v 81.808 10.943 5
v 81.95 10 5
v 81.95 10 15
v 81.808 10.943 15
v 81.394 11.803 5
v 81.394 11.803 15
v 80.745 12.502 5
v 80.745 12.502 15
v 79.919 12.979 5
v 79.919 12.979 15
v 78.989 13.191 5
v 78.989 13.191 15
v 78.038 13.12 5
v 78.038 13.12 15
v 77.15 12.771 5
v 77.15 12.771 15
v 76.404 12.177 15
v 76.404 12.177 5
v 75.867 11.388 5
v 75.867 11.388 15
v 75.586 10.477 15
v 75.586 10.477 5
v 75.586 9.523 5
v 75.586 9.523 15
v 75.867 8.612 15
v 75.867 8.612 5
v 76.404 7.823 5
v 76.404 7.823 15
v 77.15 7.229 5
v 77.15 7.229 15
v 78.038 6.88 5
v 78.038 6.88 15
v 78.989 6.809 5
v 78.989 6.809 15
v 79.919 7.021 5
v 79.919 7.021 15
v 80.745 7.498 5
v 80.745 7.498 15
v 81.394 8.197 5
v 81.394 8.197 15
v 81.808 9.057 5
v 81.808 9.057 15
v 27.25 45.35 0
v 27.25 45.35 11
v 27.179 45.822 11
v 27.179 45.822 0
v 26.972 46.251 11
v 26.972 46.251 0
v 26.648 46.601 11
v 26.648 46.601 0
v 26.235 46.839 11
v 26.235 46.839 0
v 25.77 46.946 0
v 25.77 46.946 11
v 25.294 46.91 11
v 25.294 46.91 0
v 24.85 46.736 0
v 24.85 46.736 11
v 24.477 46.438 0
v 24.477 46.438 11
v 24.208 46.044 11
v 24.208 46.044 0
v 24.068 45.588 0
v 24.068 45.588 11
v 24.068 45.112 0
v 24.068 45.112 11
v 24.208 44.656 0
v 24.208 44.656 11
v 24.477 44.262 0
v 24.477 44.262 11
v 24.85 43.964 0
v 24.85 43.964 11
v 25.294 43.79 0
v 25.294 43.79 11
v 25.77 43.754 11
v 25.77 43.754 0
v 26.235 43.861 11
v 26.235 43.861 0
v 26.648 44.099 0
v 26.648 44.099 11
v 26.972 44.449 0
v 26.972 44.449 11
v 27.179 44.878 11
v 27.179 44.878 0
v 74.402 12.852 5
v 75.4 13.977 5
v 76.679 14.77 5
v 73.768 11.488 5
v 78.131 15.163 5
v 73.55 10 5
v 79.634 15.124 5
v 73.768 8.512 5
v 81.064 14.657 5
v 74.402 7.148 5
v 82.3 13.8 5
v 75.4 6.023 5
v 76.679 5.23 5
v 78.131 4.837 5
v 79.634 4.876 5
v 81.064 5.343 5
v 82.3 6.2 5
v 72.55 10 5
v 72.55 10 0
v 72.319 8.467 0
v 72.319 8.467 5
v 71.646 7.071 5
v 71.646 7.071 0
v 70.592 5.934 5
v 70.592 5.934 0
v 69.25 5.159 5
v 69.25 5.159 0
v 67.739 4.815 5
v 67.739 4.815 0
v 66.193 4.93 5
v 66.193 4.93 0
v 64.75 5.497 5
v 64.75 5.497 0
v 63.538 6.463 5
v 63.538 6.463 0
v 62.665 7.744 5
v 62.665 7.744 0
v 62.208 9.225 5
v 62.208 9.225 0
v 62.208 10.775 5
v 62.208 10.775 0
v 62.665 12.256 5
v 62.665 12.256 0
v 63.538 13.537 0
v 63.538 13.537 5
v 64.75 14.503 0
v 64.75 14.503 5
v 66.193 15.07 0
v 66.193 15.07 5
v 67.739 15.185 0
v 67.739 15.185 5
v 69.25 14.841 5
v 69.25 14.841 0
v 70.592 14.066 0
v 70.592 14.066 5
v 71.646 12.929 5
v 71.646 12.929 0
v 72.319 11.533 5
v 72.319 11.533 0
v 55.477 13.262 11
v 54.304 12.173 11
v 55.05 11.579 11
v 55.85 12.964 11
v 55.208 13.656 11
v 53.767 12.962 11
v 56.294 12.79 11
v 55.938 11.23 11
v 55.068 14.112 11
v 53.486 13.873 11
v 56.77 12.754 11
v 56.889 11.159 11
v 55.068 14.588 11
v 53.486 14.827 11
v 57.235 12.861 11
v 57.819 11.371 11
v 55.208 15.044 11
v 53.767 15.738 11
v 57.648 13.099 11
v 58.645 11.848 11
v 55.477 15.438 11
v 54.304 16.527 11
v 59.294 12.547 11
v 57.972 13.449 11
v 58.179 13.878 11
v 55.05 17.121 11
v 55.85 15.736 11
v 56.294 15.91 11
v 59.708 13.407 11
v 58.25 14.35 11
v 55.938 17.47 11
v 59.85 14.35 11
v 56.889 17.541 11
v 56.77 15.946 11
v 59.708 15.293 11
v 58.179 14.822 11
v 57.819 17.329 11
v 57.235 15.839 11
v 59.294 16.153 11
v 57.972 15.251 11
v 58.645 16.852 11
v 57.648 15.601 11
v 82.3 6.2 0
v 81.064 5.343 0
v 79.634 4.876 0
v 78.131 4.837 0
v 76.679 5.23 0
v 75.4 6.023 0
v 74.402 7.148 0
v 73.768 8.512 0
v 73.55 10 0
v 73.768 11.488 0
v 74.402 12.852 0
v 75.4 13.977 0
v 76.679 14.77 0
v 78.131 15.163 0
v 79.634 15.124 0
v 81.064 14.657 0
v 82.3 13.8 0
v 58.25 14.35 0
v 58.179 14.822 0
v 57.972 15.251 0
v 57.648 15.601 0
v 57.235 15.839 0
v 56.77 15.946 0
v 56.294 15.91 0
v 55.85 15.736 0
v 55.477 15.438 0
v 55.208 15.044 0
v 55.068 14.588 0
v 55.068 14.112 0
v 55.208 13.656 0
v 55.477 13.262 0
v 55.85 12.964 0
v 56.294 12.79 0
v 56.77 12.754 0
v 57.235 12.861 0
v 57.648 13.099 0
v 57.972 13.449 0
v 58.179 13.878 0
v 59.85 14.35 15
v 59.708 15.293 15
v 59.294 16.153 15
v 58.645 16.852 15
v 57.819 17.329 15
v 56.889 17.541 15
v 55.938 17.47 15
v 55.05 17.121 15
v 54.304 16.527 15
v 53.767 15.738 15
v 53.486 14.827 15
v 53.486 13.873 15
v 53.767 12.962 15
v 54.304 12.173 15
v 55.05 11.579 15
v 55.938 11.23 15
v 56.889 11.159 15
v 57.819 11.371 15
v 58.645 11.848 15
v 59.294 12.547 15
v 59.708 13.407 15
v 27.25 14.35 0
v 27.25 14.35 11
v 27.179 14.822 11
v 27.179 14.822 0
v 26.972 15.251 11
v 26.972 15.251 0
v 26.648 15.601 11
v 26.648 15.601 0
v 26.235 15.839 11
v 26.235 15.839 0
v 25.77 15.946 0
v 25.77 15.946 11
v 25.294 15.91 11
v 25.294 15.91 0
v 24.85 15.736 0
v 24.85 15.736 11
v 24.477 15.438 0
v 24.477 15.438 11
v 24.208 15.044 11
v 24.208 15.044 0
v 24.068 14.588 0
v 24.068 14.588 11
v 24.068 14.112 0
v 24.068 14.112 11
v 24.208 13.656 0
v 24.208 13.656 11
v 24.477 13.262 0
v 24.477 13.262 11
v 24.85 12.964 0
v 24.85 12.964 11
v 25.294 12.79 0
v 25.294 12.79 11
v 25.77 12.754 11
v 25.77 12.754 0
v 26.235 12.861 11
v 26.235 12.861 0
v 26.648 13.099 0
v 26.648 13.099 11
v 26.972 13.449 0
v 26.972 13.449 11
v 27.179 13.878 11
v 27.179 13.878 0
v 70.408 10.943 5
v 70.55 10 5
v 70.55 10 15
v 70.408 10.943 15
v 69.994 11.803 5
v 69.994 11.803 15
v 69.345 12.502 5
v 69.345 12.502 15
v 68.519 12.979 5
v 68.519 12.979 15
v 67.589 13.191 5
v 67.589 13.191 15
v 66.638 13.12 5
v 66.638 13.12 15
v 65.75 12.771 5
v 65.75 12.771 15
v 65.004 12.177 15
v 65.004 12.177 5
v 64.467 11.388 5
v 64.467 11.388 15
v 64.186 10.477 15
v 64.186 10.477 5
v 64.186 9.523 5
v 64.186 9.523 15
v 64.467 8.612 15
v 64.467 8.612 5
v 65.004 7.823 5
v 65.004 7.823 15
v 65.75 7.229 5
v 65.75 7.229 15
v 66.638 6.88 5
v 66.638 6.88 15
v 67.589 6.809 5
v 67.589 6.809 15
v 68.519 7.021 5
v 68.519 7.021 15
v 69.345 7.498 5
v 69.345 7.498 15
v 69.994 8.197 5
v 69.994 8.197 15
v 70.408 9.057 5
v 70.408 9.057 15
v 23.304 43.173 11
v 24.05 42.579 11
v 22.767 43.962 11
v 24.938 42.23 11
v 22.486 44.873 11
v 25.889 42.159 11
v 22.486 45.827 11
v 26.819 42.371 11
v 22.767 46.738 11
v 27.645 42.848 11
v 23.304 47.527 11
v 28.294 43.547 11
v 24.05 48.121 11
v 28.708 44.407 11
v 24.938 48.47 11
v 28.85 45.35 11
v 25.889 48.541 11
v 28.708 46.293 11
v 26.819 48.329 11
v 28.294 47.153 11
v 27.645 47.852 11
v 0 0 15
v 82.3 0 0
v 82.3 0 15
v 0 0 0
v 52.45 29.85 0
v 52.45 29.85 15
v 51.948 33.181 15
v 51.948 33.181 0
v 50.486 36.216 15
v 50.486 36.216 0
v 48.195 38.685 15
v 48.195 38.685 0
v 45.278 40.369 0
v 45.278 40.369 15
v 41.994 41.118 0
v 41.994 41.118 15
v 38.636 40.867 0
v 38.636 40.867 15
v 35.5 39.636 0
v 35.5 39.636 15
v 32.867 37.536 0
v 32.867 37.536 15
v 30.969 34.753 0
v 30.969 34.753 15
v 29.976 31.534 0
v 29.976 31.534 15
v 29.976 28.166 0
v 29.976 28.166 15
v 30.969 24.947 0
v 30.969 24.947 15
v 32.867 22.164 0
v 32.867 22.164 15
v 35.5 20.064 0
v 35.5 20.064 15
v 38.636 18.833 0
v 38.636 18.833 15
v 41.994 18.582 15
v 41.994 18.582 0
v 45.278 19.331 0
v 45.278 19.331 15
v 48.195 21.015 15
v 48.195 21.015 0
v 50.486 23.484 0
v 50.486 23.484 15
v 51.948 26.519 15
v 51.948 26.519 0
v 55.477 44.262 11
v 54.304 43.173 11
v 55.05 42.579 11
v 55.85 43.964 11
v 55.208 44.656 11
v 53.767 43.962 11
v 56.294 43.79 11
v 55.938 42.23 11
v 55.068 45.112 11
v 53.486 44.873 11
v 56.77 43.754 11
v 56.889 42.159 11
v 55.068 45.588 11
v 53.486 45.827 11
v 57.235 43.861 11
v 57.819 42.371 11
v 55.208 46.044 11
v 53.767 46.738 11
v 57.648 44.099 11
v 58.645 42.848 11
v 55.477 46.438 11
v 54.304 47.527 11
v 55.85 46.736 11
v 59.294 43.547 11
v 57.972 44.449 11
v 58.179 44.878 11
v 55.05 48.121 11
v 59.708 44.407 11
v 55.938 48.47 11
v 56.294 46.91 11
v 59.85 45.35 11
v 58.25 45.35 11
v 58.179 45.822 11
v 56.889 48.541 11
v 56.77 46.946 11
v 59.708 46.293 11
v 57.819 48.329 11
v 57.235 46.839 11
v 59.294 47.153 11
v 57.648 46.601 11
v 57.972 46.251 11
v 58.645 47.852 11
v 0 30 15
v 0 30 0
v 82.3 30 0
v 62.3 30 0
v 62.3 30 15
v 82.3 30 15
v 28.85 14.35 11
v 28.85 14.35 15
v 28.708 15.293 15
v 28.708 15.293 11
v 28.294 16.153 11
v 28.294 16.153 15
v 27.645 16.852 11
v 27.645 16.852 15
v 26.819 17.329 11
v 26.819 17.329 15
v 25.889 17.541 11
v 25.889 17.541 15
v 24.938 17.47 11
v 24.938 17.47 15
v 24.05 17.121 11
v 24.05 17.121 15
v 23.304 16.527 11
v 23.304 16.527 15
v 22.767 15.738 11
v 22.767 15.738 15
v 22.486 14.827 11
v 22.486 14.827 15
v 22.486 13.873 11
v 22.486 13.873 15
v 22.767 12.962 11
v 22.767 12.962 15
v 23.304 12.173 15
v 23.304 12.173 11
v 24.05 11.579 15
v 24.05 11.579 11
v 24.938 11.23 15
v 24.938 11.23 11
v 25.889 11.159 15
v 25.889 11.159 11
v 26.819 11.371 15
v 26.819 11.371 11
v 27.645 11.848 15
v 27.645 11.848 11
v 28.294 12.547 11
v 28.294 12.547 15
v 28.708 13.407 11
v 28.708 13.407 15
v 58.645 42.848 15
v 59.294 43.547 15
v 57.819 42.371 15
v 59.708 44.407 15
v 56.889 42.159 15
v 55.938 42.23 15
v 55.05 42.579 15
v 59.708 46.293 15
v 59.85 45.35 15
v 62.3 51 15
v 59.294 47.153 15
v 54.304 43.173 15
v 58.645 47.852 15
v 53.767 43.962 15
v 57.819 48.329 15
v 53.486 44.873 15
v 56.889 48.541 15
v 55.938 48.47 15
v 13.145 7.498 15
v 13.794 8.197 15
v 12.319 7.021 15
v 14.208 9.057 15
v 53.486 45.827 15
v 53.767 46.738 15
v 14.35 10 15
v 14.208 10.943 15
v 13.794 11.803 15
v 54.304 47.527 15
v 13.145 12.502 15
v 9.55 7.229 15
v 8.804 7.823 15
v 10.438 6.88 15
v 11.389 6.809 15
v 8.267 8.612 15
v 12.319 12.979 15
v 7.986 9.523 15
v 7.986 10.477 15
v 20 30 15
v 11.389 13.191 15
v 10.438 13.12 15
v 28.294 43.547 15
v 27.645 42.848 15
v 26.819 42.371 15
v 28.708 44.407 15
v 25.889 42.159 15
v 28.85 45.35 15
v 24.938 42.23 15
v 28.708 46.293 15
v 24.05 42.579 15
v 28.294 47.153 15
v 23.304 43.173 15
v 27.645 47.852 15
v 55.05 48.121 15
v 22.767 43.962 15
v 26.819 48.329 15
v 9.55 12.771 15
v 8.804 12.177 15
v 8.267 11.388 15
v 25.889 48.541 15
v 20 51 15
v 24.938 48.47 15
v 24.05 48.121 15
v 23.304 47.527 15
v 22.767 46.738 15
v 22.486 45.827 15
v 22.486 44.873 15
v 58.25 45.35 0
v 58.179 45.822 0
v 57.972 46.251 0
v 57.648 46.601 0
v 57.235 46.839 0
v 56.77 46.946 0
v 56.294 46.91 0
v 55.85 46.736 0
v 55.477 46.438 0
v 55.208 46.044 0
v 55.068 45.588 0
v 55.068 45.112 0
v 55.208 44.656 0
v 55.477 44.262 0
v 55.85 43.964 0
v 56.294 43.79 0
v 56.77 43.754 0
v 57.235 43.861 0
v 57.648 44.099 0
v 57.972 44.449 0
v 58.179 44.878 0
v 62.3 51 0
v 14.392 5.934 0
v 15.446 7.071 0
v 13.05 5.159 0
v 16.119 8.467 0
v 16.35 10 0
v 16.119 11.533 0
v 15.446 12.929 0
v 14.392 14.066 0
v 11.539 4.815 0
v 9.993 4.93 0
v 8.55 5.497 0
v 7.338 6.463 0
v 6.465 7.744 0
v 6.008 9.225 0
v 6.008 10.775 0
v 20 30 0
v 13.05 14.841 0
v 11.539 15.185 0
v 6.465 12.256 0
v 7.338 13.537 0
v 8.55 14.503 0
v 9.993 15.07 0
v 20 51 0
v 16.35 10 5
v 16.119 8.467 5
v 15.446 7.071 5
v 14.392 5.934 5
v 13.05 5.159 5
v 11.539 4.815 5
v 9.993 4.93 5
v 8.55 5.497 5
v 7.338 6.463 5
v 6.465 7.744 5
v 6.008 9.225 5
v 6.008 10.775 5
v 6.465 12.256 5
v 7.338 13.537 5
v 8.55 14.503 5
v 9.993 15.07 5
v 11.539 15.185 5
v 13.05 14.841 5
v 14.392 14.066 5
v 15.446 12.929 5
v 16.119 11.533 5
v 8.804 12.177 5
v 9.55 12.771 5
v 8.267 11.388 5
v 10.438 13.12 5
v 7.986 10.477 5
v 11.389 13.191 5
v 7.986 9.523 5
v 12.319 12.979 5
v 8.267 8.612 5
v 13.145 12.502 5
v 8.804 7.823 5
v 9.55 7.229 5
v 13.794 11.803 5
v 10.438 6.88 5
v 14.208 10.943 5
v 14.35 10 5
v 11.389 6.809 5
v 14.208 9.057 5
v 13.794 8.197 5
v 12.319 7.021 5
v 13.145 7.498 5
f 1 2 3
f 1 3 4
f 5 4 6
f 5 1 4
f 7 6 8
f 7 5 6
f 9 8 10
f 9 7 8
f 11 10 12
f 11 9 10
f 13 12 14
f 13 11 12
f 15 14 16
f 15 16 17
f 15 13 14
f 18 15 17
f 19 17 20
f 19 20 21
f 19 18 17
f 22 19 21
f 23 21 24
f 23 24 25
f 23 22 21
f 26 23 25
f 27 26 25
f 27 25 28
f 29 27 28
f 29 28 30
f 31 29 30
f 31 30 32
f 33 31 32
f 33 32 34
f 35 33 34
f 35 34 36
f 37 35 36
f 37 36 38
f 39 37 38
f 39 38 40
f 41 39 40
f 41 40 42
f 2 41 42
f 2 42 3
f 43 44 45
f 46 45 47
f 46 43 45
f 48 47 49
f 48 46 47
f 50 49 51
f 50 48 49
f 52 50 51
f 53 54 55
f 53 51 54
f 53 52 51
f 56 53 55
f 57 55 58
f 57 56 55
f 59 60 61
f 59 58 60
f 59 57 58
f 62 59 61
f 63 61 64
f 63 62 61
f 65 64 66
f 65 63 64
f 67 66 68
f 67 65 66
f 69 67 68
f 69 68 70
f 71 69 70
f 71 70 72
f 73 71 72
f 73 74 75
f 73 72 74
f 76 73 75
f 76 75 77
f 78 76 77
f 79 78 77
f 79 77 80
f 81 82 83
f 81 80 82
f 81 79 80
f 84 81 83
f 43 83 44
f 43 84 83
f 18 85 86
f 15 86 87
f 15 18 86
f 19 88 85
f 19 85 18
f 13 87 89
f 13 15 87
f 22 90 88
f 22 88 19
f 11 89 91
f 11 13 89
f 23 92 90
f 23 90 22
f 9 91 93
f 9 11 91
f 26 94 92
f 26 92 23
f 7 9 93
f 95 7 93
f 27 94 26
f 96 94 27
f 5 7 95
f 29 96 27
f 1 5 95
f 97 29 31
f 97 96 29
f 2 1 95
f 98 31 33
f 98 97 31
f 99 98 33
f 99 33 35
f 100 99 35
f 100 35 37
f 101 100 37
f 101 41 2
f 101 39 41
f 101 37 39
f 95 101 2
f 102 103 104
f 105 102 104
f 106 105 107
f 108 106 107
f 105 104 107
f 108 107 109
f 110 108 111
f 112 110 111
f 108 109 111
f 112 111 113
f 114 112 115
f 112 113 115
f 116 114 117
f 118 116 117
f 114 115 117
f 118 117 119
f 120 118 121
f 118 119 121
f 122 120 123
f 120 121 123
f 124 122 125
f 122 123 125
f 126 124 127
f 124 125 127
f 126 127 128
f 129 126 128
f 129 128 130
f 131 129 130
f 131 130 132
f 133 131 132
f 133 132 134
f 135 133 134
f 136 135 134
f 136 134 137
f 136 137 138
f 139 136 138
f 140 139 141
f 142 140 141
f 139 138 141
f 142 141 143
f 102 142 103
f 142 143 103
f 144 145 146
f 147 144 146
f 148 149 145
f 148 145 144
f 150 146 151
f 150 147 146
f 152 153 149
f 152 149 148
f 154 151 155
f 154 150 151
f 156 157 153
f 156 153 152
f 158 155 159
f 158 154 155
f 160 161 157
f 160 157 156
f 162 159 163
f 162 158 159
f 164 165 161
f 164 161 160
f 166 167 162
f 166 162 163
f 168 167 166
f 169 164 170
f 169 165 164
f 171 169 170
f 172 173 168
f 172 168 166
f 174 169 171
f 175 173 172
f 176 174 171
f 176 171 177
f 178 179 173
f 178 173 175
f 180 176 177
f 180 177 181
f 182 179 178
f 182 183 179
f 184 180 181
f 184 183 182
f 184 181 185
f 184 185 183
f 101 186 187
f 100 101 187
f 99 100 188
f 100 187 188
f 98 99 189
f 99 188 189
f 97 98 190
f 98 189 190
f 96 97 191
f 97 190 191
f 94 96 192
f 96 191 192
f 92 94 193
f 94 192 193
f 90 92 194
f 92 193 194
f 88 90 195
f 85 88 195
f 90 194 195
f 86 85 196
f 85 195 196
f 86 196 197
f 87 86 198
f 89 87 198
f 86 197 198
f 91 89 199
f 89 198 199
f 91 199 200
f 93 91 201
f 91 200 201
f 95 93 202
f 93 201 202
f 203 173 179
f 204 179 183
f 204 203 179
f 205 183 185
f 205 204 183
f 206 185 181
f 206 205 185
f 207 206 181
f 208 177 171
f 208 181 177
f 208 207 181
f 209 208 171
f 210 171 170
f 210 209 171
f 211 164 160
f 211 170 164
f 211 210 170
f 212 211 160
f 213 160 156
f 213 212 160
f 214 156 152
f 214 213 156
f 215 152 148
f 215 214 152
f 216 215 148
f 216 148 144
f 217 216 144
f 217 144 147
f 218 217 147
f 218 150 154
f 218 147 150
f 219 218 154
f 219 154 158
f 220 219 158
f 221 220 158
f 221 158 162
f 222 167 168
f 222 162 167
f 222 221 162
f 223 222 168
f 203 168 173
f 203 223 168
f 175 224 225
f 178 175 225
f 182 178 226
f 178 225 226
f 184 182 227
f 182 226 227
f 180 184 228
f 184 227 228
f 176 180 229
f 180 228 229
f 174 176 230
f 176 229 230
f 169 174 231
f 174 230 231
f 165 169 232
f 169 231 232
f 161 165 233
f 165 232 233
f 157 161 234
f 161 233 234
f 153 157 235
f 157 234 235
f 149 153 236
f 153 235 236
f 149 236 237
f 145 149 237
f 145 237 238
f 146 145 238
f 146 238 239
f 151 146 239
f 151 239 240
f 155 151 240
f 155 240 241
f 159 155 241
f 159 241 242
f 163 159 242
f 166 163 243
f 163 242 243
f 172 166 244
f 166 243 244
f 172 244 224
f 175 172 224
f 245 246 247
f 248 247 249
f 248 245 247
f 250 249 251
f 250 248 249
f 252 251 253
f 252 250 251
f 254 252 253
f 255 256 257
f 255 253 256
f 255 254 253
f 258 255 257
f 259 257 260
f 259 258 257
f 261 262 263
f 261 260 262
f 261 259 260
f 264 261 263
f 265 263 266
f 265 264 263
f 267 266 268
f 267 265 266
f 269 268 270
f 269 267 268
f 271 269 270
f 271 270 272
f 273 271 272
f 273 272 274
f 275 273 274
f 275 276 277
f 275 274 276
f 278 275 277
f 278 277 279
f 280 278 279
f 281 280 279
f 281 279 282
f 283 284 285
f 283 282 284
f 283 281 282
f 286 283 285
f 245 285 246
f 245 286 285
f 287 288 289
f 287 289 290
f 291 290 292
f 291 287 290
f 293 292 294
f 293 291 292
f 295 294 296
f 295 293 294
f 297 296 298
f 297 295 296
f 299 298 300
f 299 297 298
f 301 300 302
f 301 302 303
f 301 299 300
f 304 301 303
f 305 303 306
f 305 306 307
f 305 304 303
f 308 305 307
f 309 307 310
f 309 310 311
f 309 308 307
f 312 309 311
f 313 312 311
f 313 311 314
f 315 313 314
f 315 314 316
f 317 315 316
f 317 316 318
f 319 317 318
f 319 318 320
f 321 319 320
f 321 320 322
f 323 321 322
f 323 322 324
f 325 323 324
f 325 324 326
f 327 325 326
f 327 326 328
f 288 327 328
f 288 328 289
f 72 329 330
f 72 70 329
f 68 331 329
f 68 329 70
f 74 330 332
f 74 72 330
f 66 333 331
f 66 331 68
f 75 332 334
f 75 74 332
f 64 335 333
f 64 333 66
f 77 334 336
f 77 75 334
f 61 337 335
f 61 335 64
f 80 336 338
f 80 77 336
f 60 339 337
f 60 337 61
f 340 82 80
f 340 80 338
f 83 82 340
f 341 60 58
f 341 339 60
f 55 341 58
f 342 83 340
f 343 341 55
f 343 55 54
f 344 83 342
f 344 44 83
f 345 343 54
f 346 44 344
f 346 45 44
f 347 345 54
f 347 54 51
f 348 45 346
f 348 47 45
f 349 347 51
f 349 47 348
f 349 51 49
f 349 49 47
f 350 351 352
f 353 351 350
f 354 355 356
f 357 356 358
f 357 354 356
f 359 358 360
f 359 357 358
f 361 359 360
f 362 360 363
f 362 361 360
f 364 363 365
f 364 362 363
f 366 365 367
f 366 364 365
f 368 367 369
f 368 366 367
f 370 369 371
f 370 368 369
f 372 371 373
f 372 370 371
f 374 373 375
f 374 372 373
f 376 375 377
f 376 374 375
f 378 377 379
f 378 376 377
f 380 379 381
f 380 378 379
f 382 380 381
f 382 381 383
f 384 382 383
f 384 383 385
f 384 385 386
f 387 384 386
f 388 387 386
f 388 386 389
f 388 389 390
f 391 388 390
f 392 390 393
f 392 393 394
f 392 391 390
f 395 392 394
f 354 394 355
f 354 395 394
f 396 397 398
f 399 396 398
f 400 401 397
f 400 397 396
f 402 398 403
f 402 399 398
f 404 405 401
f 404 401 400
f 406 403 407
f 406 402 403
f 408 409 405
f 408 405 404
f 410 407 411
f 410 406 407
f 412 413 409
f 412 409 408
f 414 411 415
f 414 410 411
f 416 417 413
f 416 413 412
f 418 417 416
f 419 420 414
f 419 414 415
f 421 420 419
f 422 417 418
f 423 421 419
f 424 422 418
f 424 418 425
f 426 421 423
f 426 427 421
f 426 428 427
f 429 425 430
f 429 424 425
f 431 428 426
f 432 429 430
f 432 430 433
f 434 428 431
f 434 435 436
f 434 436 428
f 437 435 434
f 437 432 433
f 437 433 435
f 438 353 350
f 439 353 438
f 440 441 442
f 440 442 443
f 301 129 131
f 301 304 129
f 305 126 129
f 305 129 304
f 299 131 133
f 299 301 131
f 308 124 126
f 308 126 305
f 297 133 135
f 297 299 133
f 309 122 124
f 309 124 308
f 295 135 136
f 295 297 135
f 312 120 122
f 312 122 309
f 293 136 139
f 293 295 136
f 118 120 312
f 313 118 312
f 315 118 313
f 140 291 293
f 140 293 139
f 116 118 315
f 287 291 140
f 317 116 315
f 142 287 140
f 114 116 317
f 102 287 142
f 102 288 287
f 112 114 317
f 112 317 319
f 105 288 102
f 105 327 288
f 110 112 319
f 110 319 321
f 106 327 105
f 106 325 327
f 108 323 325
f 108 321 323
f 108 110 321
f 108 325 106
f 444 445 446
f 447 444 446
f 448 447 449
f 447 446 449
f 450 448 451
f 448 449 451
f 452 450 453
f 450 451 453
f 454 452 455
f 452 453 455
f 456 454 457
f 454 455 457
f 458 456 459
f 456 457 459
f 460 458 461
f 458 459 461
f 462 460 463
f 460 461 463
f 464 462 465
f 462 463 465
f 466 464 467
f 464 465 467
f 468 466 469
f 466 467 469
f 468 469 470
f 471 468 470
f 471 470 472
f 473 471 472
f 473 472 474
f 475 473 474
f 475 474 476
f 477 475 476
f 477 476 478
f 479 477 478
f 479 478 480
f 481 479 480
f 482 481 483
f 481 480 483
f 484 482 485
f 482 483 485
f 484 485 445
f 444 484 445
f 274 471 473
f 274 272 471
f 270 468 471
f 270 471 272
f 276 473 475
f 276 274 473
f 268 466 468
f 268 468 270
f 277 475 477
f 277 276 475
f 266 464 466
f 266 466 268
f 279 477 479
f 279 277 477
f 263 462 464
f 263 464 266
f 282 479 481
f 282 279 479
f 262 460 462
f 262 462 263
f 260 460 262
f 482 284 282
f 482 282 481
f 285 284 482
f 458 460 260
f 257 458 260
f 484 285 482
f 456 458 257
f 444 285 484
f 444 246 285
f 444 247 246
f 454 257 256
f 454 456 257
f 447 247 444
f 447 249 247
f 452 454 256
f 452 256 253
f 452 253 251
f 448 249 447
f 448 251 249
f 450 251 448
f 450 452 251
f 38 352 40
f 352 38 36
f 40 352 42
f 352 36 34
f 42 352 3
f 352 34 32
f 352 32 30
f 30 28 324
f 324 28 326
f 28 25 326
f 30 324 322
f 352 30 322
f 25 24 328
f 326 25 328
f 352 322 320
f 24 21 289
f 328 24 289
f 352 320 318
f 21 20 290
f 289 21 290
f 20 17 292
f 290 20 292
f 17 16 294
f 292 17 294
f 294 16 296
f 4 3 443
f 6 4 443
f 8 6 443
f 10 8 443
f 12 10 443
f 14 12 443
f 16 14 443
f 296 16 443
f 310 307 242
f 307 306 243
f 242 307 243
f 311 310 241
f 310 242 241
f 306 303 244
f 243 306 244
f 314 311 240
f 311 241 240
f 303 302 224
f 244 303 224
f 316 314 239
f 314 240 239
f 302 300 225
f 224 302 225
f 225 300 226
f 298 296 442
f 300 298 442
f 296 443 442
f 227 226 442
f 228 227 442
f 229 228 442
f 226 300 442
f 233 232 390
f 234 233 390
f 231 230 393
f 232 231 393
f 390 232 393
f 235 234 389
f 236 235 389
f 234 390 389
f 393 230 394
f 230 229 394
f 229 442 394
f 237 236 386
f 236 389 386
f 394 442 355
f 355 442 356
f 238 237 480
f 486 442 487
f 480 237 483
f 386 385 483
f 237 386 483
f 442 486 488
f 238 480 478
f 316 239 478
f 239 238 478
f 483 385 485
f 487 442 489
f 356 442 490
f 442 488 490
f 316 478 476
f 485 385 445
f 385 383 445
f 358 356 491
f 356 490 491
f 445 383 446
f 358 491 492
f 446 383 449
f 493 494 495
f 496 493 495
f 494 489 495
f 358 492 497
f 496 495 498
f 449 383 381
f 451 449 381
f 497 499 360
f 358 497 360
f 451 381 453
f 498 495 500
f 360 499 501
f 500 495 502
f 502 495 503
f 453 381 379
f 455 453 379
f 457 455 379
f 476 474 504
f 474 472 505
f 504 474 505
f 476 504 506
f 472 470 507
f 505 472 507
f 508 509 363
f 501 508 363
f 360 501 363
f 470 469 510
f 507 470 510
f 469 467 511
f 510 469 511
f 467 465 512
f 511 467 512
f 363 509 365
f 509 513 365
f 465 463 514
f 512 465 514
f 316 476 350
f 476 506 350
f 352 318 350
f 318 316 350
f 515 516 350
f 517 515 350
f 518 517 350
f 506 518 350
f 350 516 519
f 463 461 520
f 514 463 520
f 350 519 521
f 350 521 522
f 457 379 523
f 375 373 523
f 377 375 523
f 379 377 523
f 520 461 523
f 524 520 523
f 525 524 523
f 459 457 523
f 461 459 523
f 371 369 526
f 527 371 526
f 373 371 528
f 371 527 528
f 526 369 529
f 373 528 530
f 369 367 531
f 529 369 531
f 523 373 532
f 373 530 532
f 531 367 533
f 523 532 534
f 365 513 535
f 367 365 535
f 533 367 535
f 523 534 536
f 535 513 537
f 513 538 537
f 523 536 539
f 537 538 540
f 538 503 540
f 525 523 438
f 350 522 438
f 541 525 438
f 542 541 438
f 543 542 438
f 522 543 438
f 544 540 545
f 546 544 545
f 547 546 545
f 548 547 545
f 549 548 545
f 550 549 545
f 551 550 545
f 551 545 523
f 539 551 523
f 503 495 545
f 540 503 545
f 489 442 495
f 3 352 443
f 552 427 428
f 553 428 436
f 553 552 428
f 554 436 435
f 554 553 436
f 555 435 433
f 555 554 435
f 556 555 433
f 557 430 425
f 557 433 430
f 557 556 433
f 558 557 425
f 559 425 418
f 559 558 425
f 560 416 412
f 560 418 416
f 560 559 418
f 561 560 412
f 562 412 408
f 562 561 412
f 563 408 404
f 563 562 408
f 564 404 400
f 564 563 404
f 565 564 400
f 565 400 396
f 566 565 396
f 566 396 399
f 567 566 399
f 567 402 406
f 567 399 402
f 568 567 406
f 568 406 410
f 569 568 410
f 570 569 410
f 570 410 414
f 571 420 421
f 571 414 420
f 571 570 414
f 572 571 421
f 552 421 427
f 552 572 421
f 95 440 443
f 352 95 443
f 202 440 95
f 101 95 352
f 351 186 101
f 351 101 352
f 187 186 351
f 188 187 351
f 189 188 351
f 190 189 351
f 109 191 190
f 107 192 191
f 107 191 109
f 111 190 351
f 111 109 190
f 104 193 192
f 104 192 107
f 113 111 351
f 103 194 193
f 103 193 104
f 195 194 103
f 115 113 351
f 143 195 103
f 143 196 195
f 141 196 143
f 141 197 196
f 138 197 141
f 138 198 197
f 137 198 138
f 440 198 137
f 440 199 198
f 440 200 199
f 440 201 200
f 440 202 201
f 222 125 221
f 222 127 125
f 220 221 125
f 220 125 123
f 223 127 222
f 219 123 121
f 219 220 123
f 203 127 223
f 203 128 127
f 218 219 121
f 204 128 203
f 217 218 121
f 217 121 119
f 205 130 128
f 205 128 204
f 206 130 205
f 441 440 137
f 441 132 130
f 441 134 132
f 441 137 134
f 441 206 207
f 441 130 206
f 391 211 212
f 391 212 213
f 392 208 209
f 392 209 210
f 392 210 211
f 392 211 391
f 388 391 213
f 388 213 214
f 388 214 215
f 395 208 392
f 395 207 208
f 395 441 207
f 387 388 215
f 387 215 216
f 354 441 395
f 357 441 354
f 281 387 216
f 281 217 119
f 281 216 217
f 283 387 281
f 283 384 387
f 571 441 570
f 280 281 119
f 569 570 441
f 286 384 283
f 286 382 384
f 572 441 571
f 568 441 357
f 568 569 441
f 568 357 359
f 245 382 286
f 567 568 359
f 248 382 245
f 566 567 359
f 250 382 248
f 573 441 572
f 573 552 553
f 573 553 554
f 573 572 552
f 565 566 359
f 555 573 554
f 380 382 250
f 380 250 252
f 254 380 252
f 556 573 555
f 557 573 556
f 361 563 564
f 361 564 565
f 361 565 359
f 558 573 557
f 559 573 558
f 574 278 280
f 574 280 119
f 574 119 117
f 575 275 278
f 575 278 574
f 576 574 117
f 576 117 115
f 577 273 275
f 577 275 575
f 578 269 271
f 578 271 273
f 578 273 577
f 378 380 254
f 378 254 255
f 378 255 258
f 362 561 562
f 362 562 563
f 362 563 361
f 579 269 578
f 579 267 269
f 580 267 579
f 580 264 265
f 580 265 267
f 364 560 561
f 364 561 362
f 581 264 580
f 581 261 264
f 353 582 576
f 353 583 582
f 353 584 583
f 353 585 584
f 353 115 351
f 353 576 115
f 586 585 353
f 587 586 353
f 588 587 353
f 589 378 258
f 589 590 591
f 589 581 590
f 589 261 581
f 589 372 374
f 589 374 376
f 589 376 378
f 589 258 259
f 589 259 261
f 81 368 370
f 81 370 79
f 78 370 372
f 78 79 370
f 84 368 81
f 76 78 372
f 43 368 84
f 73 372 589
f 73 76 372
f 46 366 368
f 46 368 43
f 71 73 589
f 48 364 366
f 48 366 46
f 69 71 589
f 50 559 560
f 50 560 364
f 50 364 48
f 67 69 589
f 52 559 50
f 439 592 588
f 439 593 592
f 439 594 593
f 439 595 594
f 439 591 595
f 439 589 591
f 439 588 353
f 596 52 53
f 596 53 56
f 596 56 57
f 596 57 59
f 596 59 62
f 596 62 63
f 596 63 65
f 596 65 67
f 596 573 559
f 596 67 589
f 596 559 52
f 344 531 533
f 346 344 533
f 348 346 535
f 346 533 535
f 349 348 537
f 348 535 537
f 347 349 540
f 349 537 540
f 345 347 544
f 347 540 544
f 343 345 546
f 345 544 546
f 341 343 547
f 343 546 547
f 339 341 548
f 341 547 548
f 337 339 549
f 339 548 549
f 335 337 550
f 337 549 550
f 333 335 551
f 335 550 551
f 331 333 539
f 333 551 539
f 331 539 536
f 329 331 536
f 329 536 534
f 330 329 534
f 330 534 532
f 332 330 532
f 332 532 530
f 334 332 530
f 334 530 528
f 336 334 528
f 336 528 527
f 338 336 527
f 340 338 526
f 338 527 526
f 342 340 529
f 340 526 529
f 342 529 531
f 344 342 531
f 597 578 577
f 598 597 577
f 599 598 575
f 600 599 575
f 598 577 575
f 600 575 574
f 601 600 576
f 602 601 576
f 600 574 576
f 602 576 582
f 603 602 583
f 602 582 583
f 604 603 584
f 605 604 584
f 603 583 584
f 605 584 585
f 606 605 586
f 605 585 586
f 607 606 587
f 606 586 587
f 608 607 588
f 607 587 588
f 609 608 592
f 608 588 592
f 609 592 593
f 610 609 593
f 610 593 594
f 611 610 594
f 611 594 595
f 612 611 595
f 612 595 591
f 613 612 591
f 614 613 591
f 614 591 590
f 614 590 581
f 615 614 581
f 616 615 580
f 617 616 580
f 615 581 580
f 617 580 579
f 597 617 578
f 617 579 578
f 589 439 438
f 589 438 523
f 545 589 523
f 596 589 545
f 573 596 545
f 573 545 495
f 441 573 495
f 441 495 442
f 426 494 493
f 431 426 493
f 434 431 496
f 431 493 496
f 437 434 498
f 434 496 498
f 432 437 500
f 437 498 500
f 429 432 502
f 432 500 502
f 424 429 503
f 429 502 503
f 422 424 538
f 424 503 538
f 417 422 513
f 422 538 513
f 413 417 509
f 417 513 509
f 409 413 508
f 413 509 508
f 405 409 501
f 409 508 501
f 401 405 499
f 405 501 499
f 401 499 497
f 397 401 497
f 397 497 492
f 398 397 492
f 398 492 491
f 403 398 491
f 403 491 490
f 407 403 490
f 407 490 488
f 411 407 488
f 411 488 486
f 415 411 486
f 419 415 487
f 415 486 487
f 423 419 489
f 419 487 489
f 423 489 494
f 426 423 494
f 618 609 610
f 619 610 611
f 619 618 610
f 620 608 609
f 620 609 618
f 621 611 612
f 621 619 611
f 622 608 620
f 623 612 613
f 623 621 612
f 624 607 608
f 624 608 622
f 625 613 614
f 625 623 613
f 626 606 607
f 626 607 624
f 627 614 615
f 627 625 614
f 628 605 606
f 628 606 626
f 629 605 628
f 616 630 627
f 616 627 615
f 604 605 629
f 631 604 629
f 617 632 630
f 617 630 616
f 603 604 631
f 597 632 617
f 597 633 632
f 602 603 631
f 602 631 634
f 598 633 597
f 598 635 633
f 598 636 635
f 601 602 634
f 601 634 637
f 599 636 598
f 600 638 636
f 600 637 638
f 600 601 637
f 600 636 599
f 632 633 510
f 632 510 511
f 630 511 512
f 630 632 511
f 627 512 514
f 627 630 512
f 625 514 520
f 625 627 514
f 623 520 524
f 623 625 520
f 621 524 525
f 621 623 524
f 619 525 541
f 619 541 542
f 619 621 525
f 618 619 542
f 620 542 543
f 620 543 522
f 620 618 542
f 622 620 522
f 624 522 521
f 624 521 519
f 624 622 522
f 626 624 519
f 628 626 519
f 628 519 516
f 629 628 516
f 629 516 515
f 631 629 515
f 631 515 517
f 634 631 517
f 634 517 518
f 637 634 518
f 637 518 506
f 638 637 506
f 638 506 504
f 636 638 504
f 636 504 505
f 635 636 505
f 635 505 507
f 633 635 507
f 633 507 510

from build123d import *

# Parameters (mm, degrees)
SKETCH_R        = 11.3
SKETCH_R_2      = 1.6
SKETCH_R_3      = 3.2
PAD_DEPTH       = 15
SKETCH001_R     = 3.2
POCKET_DEPTH    = 4
SKETCH002_R     = 5.2
POCKET001_DEPTH = 5


with BuildPart() as part:
    # Sketch → Pad (new body)
    with BuildSketch(Plane.XY):
        Polygon((20, 30), (20, 51), (62.3, 51), (62.3, 30), (82.3, 30), (82.3, 0), (0, 0), (0, 30), align=None)
        with Locations((41.15, 29.85)):
            Circle(SKETCH_R, mode=Mode.SUBTRACT)
        with Locations((25.65, 45.35)):
            Circle(SKETCH_R_2, mode=Mode.SUBTRACT)
        with Locations((25.65, 14.35)):
            Circle(SKETCH_R_2, mode=Mode.SUBTRACT)
        with Locations((56.65, 45.35)):
            Circle(SKETCH_R_2, mode=Mode.SUBTRACT)
        with Locations((56.65, 14.35)):
            Circle(SKETCH_R_2, mode=Mode.SUBTRACT)
        with Locations((11.15, 10)):
            Circle(SKETCH_R_3, mode=Mode.SUBTRACT)
        with Locations((67.35, 10)):
            Circle(SKETCH_R_3, mode=Mode.SUBTRACT)
        with Locations((78.75, 10)):
            Circle(SKETCH_R_3, mode=Mode.SUBTRACT)
    extrude(amount=PAD_DEPTH)

    # Sketch001 (on Face18 of Pad) → Pocket (cut)
    with BuildSketch(Plane.XY.offset(15)):
        with Locations((25.65, 45.35)):
            Circle(SKETCH001_R)
        with Locations((56.65, 45.35)):
            Circle(SKETCH001_R)
        with Locations((56.65, 14.35)):
            Circle(SKETCH001_R)
        with Locations((25.65, 14.35)):
            Circle(SKETCH001_R)
    extrude(amount=-POCKET_DEPTH, mode=Mode.SUBTRACT)

    # Sketch002 (on Face4 of Pocket) → Pocket001 (cut)
    with BuildSketch(Plane(origin=(0, 0, 0), x_dir=(1, 0, 0), z_dir=(0, 0, -1))):
        with Locations((11.15, -10)):
            Circle(SKETCH002_R)
        with Locations((67.35, -10)):
            Circle(SKETCH002_R)
        with Locations((78.75, -10)):
            Circle(SKETCH002_R)
    extrude(amount=-POCKET001_DEPTH, mode=Mode.SUBTRACT)


solid = part.part
